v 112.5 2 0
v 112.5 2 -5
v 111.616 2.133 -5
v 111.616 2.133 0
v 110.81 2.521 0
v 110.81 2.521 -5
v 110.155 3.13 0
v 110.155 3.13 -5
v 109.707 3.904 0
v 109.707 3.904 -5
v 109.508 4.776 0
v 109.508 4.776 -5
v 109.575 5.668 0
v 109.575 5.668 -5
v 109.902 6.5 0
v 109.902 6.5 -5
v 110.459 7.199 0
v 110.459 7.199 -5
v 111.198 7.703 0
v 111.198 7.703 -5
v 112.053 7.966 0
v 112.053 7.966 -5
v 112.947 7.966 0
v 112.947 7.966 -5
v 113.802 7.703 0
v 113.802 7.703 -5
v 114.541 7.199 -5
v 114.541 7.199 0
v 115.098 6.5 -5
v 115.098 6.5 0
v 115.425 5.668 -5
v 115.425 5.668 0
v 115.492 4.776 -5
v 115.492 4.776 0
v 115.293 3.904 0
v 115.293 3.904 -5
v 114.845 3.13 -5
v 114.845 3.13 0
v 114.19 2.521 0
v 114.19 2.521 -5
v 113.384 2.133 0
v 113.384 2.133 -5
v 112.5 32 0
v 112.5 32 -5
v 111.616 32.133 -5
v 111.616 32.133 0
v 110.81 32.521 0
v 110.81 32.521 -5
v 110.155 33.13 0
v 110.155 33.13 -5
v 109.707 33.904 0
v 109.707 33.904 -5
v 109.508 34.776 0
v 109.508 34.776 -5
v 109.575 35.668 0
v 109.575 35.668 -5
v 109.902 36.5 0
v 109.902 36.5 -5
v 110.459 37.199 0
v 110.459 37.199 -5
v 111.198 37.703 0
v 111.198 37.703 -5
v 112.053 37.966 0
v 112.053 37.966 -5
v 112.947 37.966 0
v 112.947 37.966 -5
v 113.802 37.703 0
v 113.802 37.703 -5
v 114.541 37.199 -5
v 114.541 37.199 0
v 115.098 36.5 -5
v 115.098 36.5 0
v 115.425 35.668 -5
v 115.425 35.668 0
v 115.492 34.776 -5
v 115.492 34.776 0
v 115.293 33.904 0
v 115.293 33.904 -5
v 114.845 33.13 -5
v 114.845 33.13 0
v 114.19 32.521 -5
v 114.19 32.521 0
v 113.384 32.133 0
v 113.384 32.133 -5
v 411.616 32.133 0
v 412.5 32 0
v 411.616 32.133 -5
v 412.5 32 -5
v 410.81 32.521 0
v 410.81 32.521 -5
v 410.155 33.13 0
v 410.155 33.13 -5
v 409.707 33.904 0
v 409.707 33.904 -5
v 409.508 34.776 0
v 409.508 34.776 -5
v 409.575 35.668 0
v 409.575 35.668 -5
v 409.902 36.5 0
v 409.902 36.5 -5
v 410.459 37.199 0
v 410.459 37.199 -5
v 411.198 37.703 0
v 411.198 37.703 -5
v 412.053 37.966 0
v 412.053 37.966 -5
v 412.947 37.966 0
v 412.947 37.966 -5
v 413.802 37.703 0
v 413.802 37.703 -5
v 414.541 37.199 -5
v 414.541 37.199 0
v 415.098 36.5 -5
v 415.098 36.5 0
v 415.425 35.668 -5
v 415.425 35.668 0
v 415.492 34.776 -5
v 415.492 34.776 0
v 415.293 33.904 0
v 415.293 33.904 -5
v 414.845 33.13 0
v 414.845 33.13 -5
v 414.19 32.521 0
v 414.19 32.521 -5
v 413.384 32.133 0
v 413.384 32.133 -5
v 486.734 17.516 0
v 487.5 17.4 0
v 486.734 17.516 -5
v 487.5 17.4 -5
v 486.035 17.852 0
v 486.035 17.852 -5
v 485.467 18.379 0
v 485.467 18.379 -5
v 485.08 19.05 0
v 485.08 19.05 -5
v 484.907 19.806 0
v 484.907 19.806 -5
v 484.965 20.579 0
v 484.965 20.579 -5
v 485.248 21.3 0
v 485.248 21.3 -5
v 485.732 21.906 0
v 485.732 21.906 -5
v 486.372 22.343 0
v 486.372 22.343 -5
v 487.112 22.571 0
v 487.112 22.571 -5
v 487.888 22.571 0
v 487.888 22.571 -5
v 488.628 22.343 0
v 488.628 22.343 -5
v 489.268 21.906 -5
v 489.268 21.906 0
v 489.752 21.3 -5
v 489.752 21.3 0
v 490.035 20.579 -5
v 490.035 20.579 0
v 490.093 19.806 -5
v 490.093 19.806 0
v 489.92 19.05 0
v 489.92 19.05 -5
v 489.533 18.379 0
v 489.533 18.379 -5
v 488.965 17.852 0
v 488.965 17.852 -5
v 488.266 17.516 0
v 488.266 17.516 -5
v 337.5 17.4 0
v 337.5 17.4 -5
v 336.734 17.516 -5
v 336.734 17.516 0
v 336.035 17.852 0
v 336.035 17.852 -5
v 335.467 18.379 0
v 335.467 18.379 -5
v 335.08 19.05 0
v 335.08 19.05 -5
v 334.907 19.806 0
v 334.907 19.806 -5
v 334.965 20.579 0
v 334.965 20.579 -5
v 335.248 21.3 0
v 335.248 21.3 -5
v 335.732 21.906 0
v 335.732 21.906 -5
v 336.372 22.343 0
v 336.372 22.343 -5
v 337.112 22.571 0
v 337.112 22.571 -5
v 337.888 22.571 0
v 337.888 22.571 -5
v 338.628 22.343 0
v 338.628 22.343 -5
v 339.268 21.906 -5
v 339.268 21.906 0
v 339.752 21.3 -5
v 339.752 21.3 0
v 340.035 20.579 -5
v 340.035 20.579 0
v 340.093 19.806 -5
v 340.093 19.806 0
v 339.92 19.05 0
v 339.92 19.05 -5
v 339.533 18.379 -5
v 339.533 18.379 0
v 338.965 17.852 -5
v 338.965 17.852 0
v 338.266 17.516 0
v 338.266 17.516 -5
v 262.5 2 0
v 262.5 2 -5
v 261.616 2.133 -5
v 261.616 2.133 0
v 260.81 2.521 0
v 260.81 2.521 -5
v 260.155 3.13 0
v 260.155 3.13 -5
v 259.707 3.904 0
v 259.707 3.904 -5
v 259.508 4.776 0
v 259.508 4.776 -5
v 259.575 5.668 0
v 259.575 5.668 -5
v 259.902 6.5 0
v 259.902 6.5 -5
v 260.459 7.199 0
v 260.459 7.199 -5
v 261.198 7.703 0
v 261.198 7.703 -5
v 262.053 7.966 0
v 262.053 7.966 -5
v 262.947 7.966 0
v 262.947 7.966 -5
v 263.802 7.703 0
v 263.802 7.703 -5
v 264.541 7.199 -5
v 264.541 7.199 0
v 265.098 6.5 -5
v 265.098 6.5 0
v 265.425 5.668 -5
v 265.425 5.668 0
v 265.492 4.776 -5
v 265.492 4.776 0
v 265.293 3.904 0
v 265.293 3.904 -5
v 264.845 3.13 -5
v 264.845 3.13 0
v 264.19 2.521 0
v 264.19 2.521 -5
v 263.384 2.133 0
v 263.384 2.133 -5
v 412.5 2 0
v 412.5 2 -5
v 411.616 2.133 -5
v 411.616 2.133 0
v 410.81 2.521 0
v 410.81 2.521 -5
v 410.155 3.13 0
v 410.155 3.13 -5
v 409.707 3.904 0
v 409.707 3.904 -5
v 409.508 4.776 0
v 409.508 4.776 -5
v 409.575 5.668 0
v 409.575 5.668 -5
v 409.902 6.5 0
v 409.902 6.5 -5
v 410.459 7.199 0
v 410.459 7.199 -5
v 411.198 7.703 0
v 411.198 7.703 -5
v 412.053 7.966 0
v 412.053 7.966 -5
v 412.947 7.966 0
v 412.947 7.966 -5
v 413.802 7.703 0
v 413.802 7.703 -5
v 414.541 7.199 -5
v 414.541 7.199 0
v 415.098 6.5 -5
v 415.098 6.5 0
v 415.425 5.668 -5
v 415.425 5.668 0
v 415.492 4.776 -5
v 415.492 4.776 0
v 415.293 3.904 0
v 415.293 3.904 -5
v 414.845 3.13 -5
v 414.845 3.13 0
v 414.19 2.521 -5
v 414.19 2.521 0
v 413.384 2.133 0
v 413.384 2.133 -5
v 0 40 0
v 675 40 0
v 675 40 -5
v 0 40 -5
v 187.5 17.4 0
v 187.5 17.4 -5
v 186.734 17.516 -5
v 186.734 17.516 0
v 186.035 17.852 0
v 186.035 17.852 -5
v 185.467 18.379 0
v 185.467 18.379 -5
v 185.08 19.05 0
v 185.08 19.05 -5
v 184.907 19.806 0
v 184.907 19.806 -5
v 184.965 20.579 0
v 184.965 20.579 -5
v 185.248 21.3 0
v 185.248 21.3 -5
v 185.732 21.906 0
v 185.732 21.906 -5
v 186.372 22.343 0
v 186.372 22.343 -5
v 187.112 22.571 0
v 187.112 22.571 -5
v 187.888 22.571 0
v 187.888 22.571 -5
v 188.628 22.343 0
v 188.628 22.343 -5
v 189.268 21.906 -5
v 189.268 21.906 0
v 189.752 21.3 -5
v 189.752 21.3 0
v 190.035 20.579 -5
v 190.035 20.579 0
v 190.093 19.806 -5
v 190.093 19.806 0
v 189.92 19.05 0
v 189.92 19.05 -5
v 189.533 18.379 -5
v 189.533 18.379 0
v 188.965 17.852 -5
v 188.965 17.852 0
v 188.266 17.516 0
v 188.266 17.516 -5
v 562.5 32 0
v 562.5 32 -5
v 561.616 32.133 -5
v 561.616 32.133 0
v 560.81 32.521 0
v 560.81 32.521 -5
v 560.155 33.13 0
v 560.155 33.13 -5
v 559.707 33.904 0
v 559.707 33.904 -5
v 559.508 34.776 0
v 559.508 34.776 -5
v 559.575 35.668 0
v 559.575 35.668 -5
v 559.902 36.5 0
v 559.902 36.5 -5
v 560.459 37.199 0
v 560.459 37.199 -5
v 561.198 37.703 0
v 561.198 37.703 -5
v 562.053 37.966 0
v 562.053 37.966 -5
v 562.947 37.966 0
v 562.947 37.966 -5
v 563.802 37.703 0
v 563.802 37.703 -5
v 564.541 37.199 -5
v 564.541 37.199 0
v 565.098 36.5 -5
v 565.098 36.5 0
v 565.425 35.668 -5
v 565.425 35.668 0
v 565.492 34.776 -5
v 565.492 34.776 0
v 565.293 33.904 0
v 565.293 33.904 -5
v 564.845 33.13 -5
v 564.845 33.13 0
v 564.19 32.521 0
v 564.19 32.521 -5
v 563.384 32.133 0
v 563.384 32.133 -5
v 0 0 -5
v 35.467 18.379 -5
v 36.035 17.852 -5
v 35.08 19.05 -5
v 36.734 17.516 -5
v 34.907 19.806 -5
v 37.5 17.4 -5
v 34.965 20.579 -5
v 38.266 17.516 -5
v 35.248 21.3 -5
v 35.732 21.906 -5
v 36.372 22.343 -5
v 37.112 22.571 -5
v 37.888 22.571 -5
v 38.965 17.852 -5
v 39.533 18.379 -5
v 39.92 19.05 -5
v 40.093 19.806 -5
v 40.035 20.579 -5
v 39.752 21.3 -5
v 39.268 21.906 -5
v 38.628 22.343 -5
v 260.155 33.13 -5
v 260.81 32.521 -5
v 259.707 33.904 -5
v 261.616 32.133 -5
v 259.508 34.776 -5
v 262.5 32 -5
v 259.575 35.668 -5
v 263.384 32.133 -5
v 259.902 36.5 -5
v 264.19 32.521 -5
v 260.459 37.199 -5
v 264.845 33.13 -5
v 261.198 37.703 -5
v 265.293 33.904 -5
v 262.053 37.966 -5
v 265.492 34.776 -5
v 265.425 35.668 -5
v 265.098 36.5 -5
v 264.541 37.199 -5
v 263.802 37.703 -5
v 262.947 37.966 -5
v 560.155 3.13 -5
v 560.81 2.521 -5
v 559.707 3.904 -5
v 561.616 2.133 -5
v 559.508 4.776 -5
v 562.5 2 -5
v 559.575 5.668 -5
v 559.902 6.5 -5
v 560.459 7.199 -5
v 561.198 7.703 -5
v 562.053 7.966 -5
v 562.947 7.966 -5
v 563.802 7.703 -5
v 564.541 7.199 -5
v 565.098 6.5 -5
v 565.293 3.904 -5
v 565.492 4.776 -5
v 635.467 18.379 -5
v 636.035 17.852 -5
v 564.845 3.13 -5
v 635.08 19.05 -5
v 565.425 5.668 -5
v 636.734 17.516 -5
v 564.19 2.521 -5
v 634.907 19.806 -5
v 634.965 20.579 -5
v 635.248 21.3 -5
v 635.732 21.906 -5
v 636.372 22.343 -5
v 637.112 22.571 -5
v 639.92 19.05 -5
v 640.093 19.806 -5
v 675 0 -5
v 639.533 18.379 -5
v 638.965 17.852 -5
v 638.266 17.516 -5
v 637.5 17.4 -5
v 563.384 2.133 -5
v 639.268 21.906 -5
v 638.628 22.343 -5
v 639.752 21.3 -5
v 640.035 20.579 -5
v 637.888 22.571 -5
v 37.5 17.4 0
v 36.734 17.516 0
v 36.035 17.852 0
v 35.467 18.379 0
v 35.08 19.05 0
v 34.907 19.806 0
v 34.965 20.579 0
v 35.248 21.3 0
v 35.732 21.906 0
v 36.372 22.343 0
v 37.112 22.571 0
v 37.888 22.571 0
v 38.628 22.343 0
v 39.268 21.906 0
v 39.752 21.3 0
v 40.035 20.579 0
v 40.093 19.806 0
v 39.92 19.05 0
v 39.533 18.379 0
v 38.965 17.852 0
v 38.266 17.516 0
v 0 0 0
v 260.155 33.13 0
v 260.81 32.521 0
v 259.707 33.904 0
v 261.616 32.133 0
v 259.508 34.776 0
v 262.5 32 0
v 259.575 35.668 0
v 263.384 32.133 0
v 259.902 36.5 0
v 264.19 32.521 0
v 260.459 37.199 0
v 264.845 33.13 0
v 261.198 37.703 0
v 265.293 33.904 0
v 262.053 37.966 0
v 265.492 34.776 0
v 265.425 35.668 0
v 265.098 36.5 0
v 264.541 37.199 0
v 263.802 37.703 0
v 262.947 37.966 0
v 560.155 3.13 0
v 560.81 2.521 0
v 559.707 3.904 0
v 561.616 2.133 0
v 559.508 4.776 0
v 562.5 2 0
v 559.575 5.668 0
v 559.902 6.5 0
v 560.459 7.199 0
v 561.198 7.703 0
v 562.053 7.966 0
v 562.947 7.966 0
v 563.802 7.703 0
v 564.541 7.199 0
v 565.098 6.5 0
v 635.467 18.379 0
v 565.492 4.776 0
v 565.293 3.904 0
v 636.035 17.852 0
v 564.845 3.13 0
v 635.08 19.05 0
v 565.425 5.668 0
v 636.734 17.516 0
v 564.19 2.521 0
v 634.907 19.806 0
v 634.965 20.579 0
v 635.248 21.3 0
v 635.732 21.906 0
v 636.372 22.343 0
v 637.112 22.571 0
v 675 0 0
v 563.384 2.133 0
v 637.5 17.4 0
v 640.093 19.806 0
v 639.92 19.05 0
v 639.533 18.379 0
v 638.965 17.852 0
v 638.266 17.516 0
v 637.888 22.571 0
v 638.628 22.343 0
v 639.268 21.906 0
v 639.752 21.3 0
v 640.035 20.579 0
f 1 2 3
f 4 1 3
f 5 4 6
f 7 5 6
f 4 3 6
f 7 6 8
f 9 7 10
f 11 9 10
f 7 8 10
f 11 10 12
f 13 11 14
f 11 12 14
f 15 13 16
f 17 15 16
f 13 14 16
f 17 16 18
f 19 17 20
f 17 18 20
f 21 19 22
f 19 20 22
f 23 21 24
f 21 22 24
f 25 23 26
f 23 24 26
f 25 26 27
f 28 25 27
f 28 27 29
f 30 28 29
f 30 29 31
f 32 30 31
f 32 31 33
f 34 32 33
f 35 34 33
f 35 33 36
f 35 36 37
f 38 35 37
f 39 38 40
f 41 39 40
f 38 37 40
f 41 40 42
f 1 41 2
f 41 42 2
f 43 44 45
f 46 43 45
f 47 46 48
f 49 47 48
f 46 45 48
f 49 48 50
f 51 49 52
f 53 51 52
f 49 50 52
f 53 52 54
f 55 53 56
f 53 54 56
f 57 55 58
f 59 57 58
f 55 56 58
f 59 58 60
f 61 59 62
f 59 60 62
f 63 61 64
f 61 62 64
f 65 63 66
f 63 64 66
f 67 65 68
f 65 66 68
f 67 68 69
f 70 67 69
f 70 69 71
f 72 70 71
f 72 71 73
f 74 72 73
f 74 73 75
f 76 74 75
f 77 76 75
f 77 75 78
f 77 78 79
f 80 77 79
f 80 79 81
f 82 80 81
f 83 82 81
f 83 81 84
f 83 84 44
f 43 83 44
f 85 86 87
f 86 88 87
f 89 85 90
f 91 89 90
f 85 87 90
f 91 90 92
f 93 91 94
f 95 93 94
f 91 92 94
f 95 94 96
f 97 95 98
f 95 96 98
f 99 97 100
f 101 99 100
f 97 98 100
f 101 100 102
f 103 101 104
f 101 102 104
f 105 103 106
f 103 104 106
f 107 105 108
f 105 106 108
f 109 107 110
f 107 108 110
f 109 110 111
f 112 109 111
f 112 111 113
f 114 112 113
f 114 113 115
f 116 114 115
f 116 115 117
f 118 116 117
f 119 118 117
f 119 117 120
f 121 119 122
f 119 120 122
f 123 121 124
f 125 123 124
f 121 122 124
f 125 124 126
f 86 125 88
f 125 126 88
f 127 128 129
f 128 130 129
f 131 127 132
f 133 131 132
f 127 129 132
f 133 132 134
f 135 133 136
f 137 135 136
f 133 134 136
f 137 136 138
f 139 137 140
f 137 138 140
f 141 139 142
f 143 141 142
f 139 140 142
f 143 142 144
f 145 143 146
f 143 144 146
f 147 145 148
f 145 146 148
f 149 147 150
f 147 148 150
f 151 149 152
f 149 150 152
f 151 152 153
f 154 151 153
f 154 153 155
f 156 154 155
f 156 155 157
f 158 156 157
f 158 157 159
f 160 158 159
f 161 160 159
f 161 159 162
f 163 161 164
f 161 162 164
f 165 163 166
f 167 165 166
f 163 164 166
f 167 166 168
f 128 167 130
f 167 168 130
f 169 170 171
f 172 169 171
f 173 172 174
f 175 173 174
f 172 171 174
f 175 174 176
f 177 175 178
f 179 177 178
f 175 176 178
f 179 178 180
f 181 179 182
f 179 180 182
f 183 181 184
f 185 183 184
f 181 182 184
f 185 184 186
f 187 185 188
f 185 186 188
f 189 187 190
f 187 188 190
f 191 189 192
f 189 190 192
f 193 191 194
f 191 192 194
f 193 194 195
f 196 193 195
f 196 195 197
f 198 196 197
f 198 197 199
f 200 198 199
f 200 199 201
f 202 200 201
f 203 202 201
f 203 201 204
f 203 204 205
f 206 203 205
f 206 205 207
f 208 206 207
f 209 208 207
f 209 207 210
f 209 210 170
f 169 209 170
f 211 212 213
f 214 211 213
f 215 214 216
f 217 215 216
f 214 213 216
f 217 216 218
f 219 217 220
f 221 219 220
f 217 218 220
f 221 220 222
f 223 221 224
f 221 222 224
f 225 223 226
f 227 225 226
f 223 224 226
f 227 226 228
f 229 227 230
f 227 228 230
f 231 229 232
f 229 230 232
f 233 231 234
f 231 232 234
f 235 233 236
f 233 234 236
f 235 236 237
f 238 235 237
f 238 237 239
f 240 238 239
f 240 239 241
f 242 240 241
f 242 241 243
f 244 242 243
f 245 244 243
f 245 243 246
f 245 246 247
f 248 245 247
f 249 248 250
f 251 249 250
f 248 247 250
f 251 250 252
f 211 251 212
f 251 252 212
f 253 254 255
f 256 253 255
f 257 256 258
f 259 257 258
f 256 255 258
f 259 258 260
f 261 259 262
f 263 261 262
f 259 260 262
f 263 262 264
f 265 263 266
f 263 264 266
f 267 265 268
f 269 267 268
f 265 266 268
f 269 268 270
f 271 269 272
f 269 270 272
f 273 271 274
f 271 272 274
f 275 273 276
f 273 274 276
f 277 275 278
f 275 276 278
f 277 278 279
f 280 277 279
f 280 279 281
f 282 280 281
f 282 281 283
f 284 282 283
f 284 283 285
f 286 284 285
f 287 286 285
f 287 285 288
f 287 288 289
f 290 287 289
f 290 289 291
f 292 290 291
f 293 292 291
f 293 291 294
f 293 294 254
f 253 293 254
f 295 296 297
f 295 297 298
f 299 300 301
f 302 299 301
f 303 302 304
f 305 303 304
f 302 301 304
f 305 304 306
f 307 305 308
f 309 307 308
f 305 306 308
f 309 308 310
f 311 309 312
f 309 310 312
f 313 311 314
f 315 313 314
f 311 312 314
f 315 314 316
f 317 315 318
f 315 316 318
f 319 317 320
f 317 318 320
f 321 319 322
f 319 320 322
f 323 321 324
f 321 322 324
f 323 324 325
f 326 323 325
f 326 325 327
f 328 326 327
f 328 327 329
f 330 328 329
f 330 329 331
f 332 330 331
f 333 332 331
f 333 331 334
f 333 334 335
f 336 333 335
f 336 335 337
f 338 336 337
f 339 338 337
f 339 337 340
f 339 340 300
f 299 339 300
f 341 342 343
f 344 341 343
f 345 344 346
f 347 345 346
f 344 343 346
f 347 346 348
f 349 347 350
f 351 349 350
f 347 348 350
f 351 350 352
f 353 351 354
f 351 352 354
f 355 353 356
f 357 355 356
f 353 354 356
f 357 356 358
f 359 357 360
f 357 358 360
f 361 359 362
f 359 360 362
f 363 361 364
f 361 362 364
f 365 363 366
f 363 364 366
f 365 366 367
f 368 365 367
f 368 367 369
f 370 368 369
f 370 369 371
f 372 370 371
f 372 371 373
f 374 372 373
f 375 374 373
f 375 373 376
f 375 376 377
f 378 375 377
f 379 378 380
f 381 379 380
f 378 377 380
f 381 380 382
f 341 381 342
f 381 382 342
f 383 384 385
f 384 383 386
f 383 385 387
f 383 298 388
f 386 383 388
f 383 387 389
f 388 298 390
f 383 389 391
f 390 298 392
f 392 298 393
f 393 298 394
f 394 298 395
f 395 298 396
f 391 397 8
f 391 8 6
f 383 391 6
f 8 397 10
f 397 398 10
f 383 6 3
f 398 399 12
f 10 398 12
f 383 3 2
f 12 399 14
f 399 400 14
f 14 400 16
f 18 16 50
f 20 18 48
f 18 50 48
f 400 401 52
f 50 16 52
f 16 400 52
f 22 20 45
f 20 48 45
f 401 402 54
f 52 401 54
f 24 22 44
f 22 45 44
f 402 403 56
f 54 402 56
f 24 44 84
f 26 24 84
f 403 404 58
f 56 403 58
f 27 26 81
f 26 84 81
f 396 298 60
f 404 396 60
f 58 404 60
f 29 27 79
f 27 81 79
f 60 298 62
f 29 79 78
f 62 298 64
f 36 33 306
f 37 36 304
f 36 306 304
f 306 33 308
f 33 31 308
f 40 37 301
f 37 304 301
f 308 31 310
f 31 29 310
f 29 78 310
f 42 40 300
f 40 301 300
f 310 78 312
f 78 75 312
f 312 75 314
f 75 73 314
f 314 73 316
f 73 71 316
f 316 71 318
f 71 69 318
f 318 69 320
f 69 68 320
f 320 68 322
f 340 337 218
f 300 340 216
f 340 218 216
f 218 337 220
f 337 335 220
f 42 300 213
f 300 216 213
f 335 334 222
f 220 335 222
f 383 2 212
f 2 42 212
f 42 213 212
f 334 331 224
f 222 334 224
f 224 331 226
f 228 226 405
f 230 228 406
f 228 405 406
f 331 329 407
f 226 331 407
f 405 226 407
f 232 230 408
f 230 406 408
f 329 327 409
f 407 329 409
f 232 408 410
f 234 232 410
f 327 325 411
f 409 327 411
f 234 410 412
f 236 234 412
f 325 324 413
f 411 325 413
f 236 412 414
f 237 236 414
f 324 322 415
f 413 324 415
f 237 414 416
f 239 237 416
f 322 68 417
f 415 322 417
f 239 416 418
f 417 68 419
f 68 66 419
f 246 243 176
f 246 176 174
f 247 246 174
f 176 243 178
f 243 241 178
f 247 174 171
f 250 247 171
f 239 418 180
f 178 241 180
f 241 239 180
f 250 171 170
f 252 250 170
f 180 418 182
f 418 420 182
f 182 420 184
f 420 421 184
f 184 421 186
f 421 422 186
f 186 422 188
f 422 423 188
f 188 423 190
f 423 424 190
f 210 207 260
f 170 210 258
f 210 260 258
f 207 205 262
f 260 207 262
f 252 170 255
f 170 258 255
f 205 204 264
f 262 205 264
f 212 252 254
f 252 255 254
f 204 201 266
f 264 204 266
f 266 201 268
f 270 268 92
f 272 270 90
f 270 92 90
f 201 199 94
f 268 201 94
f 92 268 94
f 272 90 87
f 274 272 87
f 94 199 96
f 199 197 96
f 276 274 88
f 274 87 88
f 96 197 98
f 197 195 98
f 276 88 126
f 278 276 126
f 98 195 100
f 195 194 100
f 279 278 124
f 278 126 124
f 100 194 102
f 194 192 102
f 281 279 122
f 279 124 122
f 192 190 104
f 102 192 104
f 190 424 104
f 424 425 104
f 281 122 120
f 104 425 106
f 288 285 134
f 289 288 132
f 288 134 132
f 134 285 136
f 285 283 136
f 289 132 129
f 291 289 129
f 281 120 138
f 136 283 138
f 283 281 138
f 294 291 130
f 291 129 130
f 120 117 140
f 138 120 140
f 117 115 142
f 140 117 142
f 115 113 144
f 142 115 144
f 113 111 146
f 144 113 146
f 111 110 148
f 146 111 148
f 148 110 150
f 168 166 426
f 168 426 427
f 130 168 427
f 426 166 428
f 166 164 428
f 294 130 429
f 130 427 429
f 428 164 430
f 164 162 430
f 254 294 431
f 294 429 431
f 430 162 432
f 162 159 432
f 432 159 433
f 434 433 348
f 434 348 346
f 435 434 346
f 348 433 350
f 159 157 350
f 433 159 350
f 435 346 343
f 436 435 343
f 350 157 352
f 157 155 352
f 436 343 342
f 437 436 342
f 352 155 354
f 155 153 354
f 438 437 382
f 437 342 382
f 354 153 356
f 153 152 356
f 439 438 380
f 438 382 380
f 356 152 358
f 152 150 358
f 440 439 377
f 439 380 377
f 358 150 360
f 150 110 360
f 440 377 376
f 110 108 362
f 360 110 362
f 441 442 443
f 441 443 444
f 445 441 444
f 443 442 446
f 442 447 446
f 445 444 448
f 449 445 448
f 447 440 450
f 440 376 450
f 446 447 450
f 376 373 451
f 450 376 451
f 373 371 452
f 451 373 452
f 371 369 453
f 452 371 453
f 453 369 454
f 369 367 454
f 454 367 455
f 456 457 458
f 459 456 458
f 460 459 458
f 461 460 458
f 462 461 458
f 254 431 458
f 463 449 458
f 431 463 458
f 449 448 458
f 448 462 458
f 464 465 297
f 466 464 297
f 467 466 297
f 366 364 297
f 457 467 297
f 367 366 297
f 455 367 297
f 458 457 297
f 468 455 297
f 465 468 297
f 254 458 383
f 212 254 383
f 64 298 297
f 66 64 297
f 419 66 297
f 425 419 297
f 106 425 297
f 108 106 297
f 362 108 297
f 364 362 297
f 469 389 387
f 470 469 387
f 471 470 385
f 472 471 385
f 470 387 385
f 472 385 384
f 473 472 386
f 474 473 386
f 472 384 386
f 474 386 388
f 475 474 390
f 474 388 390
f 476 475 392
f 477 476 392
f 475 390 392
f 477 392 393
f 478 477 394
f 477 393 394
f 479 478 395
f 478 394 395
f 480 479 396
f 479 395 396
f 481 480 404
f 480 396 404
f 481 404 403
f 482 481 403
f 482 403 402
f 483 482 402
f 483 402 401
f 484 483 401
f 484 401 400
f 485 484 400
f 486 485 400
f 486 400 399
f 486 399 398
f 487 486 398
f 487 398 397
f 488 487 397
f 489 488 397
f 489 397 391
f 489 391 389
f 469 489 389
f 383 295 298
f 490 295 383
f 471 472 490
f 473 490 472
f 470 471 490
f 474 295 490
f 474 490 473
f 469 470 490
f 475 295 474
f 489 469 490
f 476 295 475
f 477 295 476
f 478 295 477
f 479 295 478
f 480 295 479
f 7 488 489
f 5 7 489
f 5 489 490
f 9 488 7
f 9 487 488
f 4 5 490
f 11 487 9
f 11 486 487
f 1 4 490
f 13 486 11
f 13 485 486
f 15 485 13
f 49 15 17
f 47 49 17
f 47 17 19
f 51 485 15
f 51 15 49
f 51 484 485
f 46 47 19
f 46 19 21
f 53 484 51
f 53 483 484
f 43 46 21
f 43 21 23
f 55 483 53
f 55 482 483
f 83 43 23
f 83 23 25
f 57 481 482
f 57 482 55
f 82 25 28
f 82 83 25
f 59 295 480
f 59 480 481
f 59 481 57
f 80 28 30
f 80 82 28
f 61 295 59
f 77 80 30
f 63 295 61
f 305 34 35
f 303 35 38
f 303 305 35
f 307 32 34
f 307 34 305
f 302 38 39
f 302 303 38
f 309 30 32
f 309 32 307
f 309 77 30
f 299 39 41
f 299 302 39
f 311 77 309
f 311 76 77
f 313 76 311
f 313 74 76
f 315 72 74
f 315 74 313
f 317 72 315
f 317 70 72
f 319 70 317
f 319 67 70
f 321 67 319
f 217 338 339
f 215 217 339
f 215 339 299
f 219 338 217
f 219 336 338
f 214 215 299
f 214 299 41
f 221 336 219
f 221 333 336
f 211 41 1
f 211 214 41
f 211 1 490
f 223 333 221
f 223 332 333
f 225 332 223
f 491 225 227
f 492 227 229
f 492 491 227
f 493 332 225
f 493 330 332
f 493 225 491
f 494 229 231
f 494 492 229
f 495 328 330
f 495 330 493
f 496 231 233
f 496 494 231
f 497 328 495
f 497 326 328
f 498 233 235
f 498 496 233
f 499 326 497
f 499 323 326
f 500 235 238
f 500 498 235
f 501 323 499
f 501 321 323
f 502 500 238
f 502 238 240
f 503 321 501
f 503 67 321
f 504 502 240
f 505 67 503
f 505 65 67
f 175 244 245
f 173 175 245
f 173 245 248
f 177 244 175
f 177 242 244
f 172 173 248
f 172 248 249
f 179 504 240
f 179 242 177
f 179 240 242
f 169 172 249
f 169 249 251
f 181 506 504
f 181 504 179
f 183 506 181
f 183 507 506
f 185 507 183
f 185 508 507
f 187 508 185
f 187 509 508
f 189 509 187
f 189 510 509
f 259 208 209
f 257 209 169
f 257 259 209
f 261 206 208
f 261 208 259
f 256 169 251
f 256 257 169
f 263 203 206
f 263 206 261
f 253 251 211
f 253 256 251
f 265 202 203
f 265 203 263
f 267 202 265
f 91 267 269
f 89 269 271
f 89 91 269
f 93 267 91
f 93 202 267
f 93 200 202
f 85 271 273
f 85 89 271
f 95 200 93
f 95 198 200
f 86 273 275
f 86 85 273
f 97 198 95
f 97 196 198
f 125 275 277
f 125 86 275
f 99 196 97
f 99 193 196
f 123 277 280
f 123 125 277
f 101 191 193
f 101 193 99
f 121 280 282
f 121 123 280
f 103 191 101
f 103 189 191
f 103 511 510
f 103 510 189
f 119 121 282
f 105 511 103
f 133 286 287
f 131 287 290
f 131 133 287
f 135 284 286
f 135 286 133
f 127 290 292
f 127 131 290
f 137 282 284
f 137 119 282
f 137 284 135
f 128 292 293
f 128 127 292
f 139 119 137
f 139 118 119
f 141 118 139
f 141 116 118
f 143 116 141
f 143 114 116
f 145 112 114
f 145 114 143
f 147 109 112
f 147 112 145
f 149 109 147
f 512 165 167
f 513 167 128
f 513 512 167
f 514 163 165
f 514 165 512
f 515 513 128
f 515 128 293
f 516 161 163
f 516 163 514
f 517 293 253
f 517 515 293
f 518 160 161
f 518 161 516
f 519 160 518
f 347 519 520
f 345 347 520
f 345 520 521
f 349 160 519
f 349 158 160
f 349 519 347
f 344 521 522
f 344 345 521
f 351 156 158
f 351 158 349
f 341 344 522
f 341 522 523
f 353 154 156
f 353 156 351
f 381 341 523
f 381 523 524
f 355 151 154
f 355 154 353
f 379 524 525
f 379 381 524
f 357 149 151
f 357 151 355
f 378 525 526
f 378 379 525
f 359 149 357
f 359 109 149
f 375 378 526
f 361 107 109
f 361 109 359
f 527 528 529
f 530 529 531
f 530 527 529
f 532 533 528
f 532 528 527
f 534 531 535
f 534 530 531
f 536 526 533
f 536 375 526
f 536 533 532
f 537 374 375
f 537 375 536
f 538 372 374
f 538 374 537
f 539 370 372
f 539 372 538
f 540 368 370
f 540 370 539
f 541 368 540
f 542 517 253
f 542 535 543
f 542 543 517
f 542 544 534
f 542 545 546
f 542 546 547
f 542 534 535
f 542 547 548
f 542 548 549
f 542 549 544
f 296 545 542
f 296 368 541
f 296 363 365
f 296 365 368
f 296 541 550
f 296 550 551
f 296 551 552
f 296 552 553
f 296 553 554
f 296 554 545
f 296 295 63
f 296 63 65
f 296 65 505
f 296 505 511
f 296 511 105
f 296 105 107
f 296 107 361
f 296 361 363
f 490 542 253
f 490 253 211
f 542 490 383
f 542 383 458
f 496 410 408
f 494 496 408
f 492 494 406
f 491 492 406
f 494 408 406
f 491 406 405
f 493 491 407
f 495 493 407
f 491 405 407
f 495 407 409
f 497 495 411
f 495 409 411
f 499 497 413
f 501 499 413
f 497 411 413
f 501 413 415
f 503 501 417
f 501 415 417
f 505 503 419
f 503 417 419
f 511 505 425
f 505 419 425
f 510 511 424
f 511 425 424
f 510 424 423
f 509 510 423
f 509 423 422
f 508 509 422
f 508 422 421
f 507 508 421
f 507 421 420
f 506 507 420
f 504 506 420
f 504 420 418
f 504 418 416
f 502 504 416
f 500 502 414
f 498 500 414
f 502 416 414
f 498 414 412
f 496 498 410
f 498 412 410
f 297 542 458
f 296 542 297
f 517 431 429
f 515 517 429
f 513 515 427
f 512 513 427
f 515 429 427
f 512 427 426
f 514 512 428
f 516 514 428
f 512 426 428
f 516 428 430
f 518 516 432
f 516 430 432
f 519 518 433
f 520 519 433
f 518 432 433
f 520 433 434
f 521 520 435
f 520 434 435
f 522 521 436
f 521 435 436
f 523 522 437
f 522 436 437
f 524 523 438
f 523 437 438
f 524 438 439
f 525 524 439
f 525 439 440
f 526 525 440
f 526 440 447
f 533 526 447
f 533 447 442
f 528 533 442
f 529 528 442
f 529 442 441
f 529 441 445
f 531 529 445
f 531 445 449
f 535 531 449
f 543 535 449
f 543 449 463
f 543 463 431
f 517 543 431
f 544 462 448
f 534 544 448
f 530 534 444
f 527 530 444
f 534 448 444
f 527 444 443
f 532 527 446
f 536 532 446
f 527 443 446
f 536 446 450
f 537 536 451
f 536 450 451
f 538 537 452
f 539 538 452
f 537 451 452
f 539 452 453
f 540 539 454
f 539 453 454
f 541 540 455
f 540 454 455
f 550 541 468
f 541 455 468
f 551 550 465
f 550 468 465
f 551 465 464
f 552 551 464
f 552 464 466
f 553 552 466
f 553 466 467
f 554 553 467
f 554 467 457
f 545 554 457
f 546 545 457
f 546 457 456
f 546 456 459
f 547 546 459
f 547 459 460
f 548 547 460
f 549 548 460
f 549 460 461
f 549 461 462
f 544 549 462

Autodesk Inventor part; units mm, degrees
ref_plane "YZ Plane" through (0, 0, 0) normal (1, 0, 0) x (0, 1, 0)
ref_plane "XZ Plane" through (0, 0, 0) normal (0, 1, 0) x (-1, 0, 0)
ref_plane "XY Plane" through (0, 0, 0) normal (0, 0, 1) x (1, 0, 0)
sketch "Sketch1" plane through (0, 0, 0) normal (0, 0, 1) x (1, 0, 0)
  line L0 (0, 0) -> (675, 0)
  line L1 (675, 0) -> (675, 40)
  line L2 (675, 40) -> (0, 40)
  line L3 (0, 40) -> (0, 0)
  line L4 (0, 20) -> (675, 20) construction
  line L5 (0, 5) -> (675, 5) construction
  line L6 (0, 35) -> (675, 35) construction
  line L7 (337.5, 40) -> (337.5, 0) construction
  circle A0 centre (37.5, 20) radius 2.6
  circle A1 centre (187.5, 20) radius 2.6
  circle A2 centre (337.5, 20) radius 2.6
  circle A3 centre (487.5, 20) radius 2.6
  circle A4 centre (637.5, 20) radius 2.6
  circle A5 centre (112.5, 5) radius 3
  circle A6 centre (262.5, 5) radius 3
  circle A7 centre (412.5, 5) radius 3
  circle A8 centre (562.5, 5) radius 3
  circle A9 centre (112.5, 35) radius 3
  circle A10 centre (262.5, 35) radius 3
  circle A11 centre (412.5, 35) radius 3
  circle A12 centre (562.5, 35) radius 3
  point P0 (37.5, 20)
  point P1 (112.5, 5)
  point P2 (262.5, 5)
  point P3 (412.5, 5)
  point P4 (562.5, 5)
  dimension "d16" = 675
  dimension "d17" = 40
  dimension "d20" = 37.5
  dimension "d22" = 5.2
  dimension "d25" = 150
  dimension "d31" = 75
  dimension "d32" = 6
  dimension "d35" = 150
  dimension "d42" = 150
  dimension "d47" = 30
extrude "Extrusion1" add sketch "Sketch1" against normal blind 5 contours L3 L2 L1 L0 | A0 | A1 | A2 | A3 | A4 | A5 | A6 | A7 | A8 | A9 | A10 | A11 | A12
hole "Hole1" at (37.5, 20, 0) at (187.5, 20, 0) at (337.5, 20, 0) at (487.5, 20, 0) at (637.5, 20, 0) direction (0, 0, -1) diameter 5.2 end through all
hole "Hole2" at (112.5, 5, 0) at (262.5, 5, 0) at (412.5, 5, 0) at (562.5, 5, 0) at (112.5, 35, 0) at (262.5, 35, 0) at (412.5, 35, 0) at (562.5, 35, 0) direction (0, 0, -1) diameter 6 end through all
thread "Thread9" size "M6x1" class "6H" standard "ISO Metric profile" full length
thread "Thread10" size "M6x1" class "6H" standard "ISO Metric profile" full length
thread "Thread11" size "M6x1" class "6H" standard "ISO Metric profile" full length
thread "Thread12" size "M6x1" class "6H" standard "ISO Metric profile" full length
thread "Thread13" size "M6x1" class "6H" standard "ISO Metric profile" full length
thread "Thread14" size "M6x1" class "6H" standard "ISO Metric profile" full length
thread "Thread15" size "M6x1" class "6H" standard "ISO Metric profile" full length
thread "Thread16" size "M6x1" class "6H" standard "ISO Metric profile" full length
properties part number "Rail_bracket" material "Stainless Steel"
